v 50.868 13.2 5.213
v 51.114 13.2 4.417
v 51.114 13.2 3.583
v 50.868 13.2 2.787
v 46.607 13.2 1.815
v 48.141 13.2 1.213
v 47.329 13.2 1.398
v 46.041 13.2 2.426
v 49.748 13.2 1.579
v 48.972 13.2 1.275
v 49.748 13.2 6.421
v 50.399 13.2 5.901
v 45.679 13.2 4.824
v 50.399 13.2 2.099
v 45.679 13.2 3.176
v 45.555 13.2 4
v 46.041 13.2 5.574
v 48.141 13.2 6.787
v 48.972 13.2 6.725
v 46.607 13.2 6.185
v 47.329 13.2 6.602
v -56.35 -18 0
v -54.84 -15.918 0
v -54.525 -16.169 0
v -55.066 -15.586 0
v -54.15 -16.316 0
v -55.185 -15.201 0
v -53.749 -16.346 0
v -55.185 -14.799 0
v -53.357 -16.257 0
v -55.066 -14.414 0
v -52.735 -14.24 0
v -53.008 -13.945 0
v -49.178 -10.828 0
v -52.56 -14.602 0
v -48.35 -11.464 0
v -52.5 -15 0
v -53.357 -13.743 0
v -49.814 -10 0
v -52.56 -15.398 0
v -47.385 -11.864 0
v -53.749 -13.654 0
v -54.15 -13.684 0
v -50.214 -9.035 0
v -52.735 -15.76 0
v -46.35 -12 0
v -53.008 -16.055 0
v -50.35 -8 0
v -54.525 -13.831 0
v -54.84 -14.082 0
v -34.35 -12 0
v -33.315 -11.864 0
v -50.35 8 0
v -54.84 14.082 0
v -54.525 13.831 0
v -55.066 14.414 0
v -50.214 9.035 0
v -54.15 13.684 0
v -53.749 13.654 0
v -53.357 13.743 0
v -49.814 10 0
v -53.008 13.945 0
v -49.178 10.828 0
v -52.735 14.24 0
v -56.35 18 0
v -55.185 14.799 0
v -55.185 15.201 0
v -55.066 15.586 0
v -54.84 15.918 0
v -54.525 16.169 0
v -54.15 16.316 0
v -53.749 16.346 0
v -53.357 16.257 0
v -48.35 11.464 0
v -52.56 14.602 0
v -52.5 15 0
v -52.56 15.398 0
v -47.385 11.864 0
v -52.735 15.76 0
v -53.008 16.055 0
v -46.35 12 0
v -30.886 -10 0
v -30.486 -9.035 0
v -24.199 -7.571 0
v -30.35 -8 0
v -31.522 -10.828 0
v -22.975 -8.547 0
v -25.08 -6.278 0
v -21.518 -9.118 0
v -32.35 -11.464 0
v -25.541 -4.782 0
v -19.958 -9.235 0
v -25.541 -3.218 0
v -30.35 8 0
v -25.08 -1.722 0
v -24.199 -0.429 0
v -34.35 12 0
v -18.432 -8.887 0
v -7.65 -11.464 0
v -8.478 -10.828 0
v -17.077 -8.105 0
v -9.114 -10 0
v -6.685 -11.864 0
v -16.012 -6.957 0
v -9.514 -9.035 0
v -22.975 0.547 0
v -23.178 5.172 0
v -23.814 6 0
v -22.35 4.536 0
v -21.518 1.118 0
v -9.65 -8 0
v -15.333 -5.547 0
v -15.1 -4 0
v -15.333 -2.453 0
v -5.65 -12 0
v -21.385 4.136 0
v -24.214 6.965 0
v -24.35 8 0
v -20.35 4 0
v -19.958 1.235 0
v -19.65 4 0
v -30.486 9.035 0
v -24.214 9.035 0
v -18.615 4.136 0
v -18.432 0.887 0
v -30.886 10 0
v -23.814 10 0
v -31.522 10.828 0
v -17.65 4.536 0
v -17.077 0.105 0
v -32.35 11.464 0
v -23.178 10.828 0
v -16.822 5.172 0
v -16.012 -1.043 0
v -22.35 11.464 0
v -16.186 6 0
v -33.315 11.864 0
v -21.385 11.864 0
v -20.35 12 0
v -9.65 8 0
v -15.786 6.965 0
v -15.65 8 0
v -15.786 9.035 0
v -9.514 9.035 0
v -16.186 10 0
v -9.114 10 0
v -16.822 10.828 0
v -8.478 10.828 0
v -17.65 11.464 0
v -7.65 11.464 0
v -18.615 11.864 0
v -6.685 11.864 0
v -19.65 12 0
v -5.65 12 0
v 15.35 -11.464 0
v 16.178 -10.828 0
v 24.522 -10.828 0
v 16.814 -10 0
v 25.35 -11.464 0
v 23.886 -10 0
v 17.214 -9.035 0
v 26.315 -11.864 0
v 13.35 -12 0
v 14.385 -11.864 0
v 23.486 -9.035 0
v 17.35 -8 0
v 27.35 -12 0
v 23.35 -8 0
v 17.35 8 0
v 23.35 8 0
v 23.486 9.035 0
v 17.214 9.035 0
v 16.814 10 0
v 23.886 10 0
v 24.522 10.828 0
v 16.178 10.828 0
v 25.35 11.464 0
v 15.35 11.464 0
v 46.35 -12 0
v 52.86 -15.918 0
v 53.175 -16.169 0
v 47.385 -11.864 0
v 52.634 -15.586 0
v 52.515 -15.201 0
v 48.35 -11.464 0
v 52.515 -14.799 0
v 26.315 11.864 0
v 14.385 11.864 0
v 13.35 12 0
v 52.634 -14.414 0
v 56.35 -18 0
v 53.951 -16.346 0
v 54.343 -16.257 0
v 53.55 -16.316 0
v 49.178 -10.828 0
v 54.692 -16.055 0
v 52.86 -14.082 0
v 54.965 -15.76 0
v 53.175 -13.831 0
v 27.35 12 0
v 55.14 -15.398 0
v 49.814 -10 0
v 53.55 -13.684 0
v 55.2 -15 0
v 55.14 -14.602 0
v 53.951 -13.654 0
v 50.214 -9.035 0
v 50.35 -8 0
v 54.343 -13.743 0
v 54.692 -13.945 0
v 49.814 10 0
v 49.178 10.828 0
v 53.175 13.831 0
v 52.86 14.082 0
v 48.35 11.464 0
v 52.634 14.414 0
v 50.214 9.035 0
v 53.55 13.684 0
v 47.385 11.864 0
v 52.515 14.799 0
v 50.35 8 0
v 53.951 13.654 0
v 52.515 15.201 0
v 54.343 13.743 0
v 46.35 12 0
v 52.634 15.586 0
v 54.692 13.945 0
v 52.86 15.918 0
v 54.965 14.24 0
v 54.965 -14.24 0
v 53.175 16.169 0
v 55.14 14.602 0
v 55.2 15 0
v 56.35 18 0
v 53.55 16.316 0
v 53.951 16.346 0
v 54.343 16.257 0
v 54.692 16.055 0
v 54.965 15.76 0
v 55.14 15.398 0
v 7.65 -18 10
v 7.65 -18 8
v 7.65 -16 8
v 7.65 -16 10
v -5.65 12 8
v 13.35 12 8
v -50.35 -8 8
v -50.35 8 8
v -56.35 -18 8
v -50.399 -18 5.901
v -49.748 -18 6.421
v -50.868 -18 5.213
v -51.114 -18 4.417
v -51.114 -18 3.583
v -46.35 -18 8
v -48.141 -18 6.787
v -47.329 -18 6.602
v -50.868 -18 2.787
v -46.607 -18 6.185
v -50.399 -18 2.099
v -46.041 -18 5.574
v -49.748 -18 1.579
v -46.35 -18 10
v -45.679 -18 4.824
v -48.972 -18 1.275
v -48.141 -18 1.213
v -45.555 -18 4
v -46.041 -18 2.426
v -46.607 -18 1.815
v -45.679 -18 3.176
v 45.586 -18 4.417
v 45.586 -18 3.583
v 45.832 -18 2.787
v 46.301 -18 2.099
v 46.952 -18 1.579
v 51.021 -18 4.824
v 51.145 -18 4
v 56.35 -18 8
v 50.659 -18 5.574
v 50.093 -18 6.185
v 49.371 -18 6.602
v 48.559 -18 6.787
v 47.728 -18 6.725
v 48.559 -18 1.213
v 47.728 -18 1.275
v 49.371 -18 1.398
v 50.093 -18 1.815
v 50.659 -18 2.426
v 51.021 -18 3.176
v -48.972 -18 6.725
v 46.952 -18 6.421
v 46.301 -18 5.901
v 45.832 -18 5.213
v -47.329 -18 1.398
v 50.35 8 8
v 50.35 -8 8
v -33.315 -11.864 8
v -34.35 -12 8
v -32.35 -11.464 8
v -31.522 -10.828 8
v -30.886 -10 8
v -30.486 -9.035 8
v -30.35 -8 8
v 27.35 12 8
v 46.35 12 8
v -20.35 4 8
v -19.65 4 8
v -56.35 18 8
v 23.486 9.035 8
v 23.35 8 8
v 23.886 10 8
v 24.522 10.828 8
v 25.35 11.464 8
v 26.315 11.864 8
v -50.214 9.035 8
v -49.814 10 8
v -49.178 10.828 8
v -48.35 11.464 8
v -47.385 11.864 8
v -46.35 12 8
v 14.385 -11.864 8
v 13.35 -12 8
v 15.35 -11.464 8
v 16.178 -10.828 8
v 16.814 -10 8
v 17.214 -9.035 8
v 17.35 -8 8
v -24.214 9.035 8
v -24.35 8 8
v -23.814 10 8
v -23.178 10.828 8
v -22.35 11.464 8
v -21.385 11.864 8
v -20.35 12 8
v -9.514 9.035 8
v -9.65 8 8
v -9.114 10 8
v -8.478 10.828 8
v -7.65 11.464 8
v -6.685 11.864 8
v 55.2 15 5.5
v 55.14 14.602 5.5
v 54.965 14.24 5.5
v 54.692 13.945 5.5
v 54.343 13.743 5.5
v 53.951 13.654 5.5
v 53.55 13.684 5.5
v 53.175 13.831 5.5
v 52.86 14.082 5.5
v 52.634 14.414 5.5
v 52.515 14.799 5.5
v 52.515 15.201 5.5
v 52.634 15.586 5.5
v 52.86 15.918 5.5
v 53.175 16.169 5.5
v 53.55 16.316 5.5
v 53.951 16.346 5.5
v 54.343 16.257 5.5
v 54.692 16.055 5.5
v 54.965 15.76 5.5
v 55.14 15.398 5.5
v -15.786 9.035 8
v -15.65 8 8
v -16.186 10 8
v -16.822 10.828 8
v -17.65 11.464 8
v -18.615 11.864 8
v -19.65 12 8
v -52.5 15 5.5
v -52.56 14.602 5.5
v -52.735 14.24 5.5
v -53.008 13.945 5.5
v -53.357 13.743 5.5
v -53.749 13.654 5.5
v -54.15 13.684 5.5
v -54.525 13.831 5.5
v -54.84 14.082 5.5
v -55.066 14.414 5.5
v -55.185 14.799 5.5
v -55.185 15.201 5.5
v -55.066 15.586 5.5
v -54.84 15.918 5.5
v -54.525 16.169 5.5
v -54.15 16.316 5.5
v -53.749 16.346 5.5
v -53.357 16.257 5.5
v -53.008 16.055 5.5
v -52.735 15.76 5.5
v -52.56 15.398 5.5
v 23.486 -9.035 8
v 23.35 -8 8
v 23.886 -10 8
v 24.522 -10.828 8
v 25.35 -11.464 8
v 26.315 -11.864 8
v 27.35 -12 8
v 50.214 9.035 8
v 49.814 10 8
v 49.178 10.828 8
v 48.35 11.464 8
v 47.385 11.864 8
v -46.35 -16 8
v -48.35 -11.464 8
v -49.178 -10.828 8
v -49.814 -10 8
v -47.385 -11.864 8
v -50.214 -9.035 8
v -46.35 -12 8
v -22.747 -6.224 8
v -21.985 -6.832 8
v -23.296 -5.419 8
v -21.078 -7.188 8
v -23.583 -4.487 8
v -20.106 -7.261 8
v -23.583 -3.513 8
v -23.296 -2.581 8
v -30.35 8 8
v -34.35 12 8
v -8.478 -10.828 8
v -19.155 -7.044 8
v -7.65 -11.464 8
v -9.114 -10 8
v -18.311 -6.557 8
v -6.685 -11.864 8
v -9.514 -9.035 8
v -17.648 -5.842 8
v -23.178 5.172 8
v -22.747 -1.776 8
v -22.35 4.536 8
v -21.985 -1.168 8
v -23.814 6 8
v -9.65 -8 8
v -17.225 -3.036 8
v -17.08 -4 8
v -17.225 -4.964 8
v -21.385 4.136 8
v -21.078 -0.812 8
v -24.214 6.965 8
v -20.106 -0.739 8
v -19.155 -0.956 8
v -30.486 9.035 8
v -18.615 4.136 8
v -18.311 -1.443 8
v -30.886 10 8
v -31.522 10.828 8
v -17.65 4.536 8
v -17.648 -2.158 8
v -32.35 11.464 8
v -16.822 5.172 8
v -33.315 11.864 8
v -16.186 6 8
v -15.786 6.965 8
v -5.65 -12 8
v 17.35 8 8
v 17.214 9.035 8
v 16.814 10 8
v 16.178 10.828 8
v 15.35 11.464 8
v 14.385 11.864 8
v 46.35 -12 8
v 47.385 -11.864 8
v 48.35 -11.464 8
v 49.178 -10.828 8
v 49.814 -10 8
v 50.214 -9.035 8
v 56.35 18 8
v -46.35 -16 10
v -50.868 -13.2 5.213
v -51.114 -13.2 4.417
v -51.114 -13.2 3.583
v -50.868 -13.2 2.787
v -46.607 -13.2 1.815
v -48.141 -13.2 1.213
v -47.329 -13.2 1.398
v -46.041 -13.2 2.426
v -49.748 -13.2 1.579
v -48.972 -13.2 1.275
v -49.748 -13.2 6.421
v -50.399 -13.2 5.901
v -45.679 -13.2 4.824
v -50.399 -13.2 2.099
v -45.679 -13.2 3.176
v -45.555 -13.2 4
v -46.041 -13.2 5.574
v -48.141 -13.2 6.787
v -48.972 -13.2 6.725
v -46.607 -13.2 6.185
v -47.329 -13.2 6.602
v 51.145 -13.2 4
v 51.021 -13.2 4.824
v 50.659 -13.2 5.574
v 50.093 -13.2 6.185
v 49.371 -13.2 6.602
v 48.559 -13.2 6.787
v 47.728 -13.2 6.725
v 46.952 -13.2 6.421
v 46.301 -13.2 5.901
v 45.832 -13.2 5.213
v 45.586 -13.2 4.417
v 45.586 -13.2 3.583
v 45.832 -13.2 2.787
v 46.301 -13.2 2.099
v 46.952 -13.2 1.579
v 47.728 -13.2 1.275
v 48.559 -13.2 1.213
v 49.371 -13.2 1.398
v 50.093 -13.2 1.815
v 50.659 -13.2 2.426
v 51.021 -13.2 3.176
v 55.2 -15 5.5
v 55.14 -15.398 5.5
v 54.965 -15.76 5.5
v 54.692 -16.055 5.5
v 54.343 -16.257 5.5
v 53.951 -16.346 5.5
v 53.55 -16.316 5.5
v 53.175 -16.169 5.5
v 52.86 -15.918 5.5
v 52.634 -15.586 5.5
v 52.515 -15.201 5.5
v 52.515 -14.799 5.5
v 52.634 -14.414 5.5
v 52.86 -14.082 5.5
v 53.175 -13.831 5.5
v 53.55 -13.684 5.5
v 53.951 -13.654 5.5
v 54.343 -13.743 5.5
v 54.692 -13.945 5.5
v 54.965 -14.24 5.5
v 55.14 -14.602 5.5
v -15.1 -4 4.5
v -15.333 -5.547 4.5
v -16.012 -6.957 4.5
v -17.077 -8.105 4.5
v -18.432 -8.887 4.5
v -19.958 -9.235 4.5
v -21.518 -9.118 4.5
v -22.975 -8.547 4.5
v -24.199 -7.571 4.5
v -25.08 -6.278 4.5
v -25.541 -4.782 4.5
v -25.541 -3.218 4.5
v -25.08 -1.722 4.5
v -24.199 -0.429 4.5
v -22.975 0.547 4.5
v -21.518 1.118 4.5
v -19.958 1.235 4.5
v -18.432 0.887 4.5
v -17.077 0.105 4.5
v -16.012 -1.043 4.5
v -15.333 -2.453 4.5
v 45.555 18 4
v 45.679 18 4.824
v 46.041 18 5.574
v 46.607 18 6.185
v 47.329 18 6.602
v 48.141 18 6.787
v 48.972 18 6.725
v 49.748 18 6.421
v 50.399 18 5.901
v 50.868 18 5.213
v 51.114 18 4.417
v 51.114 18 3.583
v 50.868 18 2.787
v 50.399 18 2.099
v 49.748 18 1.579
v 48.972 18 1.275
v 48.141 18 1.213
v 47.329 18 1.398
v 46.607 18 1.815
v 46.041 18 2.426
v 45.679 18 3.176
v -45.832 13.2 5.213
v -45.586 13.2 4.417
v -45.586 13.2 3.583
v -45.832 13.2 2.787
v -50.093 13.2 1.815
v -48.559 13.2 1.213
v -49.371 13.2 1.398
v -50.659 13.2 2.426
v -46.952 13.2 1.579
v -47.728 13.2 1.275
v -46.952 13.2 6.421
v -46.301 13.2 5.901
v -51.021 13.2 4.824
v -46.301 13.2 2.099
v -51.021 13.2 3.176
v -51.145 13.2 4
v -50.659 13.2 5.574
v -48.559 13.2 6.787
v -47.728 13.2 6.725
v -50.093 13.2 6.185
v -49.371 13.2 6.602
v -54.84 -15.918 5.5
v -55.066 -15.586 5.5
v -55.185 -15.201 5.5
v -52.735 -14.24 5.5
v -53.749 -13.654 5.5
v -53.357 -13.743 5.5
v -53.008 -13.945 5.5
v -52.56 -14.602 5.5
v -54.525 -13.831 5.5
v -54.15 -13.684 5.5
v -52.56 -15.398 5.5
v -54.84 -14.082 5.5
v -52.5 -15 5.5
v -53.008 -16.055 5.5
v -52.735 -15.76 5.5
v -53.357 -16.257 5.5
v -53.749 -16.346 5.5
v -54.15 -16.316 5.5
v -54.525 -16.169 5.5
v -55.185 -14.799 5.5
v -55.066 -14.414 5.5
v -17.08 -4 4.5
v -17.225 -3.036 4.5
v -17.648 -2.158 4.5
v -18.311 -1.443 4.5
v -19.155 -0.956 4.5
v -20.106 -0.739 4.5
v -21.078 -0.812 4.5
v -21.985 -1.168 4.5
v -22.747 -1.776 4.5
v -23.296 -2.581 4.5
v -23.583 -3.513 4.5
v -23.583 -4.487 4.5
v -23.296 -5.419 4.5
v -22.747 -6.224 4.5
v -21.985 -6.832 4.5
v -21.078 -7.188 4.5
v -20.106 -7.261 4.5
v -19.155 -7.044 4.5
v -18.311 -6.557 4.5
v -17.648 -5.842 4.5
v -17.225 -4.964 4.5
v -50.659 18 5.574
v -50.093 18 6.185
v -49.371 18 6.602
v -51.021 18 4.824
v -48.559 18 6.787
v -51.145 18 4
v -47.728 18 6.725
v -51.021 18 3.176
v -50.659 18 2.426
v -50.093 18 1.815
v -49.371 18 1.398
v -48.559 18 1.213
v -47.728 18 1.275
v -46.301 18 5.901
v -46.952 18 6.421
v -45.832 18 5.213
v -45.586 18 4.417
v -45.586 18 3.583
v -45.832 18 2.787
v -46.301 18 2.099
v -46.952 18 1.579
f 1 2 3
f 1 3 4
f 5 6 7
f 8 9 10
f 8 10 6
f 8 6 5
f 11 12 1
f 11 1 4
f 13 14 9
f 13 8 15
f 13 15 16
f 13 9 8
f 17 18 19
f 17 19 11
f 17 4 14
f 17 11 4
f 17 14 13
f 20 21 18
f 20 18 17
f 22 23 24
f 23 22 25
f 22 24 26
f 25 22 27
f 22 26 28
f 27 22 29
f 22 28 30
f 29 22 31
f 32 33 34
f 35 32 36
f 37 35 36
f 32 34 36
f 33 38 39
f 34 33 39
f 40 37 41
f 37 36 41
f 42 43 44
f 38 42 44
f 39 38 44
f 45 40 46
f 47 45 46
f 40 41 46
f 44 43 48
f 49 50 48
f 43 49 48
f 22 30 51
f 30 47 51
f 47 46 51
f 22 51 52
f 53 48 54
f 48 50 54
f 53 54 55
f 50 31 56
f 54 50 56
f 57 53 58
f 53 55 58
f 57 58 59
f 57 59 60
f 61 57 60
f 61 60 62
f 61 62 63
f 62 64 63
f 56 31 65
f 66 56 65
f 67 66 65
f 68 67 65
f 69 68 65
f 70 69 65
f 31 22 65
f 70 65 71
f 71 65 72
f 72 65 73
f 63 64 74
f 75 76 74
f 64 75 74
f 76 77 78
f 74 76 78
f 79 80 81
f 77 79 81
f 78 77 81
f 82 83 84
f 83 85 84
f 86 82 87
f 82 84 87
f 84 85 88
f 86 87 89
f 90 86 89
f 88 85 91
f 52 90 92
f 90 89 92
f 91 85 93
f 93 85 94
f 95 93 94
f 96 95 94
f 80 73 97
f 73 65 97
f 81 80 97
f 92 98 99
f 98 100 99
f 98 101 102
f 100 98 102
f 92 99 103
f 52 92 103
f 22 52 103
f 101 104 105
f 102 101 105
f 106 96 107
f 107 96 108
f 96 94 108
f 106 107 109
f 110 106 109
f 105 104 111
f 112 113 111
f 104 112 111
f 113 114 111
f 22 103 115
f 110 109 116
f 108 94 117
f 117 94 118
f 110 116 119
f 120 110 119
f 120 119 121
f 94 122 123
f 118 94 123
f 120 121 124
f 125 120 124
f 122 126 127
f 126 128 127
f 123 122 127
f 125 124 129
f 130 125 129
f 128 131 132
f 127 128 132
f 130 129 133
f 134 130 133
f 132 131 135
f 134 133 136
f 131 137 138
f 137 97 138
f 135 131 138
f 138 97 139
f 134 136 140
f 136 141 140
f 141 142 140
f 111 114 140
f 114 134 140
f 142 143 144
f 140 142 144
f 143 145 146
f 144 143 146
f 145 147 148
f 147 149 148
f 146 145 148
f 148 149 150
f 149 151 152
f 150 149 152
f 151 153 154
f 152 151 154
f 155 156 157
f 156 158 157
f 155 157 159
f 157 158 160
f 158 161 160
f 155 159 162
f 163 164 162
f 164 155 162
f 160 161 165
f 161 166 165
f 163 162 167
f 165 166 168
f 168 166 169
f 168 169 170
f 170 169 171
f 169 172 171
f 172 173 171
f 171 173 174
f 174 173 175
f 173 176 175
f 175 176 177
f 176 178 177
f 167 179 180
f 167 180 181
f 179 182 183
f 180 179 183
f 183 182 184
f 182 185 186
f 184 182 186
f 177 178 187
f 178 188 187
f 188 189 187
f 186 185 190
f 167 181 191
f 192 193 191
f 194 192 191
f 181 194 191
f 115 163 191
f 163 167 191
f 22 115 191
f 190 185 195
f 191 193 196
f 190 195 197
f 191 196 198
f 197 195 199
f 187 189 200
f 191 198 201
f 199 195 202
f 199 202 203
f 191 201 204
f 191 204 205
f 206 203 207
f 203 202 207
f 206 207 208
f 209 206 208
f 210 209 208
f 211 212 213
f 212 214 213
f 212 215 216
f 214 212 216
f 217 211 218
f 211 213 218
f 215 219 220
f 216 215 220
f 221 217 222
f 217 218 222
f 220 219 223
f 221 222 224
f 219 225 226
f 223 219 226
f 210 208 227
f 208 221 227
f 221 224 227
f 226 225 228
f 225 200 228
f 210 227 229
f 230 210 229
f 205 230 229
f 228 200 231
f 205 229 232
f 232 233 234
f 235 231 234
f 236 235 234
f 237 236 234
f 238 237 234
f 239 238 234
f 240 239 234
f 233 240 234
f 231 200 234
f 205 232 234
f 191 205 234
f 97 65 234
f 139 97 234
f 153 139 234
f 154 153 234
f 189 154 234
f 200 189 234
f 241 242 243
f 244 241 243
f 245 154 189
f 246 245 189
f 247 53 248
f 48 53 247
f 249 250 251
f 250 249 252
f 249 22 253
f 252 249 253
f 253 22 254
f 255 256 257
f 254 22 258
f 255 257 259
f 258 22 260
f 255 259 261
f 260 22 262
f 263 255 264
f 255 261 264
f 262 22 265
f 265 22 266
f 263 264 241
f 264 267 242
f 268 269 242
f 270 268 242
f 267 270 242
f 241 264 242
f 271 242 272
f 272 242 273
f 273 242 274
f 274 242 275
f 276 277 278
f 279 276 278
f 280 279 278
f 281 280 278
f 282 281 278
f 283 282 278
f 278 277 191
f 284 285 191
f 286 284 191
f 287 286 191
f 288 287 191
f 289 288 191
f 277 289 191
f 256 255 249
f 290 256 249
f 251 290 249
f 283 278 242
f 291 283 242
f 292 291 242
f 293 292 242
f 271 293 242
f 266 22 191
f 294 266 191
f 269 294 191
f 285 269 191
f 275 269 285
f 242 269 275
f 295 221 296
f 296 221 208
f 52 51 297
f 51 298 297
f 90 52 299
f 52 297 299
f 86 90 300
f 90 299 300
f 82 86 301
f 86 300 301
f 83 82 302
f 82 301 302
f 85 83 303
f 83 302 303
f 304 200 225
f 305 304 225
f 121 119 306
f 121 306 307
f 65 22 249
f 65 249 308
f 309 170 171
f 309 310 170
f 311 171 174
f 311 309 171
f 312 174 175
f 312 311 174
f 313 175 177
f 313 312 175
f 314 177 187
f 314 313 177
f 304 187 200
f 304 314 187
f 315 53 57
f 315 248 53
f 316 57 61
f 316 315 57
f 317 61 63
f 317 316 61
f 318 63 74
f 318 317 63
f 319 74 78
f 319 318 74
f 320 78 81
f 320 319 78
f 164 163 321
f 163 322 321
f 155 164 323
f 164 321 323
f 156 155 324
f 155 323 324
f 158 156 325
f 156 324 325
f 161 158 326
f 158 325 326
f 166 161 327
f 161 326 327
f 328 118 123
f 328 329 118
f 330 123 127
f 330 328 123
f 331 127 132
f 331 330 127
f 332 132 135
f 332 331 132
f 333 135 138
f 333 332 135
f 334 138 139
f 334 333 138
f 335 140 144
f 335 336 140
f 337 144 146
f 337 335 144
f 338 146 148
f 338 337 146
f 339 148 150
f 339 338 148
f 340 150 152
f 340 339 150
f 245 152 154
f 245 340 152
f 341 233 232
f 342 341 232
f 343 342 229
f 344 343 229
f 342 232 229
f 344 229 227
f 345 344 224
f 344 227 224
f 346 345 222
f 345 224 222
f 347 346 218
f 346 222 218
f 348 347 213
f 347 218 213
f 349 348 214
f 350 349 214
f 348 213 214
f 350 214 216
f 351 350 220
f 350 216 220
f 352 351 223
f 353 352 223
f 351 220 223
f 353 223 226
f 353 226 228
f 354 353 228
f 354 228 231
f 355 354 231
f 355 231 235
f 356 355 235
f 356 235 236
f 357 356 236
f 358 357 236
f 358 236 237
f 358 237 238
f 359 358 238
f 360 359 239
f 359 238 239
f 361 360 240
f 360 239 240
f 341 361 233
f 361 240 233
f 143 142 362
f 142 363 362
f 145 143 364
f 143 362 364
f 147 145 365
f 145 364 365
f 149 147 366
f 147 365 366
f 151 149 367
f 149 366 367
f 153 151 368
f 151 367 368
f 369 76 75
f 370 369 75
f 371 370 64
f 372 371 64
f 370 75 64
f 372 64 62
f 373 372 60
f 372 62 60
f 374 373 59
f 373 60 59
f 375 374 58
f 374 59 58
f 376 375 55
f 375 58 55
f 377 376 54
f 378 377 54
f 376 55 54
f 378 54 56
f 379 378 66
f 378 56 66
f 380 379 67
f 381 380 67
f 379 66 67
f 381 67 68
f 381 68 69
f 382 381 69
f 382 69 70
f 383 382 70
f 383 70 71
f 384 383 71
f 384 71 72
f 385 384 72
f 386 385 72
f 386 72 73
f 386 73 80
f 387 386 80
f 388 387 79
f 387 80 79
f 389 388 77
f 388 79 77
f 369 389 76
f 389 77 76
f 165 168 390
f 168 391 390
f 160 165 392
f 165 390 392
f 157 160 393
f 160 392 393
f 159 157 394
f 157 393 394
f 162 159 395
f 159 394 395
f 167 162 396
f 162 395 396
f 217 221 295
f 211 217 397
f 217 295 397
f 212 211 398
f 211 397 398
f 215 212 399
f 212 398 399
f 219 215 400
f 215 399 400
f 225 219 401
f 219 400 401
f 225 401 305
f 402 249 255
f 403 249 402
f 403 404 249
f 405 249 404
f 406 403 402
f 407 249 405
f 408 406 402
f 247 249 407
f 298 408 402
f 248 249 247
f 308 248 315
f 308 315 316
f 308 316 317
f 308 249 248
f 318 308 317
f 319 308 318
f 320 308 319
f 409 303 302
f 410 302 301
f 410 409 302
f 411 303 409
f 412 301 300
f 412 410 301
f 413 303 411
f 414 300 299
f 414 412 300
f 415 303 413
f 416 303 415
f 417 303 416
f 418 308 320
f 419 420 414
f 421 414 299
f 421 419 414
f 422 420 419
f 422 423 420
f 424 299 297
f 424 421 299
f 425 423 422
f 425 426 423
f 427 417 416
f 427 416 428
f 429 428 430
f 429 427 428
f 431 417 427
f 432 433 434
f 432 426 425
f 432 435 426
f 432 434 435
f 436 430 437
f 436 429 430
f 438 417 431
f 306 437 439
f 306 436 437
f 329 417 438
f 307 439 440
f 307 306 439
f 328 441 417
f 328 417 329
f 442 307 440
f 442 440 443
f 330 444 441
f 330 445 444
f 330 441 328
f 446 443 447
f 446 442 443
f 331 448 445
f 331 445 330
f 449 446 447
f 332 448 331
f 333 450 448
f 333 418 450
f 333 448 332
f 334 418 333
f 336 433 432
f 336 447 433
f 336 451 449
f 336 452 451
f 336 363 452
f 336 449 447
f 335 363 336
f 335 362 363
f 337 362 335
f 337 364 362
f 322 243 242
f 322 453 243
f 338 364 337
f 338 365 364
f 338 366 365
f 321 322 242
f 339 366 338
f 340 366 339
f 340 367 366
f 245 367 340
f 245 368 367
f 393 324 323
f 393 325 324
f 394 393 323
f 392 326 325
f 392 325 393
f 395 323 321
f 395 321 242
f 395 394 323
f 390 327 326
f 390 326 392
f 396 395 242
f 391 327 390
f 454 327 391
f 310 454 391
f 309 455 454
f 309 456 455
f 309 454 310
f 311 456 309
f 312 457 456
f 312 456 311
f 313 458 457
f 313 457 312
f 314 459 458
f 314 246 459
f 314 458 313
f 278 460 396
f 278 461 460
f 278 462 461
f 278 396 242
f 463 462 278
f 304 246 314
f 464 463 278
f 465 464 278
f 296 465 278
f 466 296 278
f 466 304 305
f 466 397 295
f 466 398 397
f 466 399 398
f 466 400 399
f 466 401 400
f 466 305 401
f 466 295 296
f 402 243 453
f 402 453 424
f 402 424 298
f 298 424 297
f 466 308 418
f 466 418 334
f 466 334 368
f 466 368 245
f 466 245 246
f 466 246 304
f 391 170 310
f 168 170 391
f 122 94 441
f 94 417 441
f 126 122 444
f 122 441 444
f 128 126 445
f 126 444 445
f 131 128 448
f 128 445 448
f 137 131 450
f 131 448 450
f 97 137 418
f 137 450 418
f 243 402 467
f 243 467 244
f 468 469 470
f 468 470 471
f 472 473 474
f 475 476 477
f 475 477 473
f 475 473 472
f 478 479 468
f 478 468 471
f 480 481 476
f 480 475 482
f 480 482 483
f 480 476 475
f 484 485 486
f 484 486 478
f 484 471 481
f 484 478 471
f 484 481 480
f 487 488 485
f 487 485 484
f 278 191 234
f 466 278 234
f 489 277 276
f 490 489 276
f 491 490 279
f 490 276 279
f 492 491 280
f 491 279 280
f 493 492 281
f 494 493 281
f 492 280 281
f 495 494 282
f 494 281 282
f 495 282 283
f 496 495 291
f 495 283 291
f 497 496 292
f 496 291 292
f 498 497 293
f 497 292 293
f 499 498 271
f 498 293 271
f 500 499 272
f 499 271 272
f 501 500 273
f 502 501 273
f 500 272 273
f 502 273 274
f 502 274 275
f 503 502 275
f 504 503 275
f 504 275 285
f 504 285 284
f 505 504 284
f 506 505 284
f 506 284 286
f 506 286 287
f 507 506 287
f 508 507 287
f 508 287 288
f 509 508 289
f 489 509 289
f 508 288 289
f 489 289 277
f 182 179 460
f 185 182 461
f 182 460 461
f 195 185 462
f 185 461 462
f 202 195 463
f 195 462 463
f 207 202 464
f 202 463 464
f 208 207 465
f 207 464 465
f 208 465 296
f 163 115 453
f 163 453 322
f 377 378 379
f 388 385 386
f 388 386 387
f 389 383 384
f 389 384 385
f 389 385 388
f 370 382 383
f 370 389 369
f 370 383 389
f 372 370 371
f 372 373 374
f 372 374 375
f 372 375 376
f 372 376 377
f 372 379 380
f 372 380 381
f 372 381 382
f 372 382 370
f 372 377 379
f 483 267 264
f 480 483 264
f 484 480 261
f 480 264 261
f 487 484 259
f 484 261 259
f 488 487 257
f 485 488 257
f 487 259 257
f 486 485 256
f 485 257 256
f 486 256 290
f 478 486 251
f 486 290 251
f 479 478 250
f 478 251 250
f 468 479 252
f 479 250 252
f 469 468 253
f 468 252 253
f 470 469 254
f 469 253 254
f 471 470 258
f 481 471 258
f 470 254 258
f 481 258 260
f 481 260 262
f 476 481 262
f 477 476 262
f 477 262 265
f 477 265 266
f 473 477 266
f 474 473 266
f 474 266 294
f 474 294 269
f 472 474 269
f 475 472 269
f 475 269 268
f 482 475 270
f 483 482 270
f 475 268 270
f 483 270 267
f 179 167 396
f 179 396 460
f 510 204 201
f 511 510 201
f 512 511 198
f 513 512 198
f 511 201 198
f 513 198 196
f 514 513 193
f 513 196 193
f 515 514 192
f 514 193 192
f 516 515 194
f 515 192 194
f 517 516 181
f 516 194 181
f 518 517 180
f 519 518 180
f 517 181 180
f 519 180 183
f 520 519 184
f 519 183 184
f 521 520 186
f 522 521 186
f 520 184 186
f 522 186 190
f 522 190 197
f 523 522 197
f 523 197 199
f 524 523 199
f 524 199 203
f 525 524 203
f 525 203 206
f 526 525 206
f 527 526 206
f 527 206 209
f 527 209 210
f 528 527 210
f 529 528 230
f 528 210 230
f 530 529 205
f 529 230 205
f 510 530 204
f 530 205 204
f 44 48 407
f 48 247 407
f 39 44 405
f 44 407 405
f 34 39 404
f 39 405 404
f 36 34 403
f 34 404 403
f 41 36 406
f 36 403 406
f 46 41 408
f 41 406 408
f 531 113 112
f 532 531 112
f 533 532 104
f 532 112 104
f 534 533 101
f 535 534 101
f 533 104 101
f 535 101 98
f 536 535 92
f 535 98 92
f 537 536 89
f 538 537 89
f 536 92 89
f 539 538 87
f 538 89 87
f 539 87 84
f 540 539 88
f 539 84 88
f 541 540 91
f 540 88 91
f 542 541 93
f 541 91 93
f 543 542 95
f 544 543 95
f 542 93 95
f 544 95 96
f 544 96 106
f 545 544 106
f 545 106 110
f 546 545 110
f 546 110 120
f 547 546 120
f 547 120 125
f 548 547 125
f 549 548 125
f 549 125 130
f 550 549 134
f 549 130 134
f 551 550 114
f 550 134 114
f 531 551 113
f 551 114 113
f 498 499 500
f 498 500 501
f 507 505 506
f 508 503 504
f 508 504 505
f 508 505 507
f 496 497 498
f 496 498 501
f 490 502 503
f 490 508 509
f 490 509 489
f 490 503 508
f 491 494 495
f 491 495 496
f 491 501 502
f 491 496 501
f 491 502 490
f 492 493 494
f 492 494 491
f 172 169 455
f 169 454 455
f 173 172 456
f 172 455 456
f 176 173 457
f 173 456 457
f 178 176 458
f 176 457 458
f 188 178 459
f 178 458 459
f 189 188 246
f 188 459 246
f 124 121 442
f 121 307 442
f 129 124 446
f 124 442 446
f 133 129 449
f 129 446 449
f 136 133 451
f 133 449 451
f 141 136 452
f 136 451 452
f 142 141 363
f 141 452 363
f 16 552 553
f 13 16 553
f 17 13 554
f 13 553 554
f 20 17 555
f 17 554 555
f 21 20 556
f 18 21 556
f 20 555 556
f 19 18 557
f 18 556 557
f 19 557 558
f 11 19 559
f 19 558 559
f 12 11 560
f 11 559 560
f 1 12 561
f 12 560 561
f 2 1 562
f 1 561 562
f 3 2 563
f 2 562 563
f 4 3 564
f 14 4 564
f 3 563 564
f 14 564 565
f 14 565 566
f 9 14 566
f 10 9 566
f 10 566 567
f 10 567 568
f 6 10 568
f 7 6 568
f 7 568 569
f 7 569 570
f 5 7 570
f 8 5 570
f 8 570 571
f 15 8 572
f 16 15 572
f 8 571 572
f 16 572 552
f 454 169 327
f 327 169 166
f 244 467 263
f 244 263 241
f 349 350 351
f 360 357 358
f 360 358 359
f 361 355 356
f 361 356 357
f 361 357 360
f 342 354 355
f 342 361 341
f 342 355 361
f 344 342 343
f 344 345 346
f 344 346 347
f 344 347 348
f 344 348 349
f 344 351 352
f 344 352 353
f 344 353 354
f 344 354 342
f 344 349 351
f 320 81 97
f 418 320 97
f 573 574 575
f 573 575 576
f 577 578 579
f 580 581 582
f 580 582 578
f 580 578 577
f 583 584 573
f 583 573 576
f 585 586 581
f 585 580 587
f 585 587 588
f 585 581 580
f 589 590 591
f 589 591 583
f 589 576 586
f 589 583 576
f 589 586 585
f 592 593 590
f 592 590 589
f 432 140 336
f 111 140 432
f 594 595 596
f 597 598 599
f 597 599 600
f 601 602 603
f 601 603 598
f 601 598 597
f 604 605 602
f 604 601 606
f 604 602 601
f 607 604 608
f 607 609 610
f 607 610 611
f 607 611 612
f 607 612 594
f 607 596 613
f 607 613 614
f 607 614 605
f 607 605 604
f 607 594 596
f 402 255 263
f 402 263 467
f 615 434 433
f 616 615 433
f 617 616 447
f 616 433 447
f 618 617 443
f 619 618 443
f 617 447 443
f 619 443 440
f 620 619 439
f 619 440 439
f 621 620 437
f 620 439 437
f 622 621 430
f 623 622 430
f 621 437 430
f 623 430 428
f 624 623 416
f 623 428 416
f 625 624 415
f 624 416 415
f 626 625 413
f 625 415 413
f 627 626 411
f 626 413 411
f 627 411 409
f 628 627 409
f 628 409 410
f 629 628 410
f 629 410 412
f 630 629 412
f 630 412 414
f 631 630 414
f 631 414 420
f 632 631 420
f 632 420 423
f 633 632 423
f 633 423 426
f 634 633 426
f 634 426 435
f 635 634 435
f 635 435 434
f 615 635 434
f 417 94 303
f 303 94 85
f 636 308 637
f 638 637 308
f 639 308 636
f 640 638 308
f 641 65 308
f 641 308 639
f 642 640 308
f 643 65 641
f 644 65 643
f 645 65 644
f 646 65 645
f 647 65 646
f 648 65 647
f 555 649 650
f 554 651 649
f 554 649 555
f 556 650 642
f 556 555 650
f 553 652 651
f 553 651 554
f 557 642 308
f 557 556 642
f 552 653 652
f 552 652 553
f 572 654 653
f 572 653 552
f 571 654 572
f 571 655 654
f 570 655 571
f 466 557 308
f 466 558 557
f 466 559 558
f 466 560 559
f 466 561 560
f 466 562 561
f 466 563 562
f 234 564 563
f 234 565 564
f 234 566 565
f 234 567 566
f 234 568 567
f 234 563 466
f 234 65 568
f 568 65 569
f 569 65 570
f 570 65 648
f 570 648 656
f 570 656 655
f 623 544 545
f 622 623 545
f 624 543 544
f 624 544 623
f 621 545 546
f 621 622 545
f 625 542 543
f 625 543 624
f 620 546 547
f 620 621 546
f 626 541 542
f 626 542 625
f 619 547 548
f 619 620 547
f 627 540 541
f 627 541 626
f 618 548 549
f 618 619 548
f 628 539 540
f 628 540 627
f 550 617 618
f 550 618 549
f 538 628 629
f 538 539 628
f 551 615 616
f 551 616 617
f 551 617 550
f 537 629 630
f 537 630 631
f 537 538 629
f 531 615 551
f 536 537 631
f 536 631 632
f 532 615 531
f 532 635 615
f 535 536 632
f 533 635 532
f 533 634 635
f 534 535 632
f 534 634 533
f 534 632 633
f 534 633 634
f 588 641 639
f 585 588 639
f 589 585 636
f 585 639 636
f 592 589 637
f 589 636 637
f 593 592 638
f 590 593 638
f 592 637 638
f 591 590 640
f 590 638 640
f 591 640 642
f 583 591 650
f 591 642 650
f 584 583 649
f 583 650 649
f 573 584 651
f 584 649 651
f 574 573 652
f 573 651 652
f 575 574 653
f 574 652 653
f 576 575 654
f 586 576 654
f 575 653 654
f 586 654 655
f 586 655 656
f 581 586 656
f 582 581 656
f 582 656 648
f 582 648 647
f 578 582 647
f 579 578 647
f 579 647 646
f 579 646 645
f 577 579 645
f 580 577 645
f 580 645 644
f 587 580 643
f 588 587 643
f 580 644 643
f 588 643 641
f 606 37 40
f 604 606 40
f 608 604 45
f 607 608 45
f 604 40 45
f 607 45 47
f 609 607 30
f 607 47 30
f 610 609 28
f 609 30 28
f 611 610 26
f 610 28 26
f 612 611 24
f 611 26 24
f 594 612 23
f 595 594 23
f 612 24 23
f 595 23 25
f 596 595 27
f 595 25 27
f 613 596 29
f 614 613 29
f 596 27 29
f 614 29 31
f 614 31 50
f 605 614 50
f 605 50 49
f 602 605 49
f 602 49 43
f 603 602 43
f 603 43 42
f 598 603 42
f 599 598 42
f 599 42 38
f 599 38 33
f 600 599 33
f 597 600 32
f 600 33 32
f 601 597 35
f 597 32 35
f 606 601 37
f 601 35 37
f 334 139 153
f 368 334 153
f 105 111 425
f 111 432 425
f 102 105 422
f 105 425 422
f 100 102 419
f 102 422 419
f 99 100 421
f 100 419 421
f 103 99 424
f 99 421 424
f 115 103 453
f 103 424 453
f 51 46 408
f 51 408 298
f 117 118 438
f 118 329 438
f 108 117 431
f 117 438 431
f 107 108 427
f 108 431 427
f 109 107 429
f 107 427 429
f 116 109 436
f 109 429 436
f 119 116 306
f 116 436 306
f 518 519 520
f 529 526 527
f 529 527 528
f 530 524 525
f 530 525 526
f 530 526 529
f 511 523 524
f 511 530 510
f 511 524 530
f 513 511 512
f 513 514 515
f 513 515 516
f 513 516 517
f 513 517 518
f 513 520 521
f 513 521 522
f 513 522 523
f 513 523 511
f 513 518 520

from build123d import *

# Parameters (mm, degrees)
F0_W      = 112.7
F0_H      = 36
F1_DEPTH  = 8
F3_W      = 54
F3_H      = 2
F4_DEPTH  = 2
F5_R      = 3.27
F6_DEPTH  = 8.001
F7_R      = 1.35
F8_DEPTH  = 5.5
F10_R     = 5.25
F11_DEPTH = 4.5
F9_W      = 20
F9_H      = 24
F9_W_2    = 27
F9_W_3    = 8.7
F9_H_2    = 8
F12_DEPTH = 10.001
F13_R     = 3.99999
F14_R     = 2.795
F15_DEPTH = 4.8
F16_R     = 2.795
F17_DEPTH = 4.8


# Not quite as in the source:
# - a fillet or chamfer is up to 0.001 mm smaller than in the source, because OpenCascade refuses the exact size


with BuildPart() as f1:
    # F0 (on Top) → F1 (new body)
    with BuildSketch(Plane.XY):
        Rectangle(F0_W, F0_H)
    extrude(amount=F1_DEPTH)

    # F3 (on face) → F4 (join)
    with BuildSketch(Plane.XY.offset(8)):
        with Locations((-19.35, -17)):
            Rectangle(F3_W, F3_H)
    extrude(amount=F4_DEPTH)

    # F5 (on face) → F6 (cut, through all)
    with BuildSketch(Plane.XY.offset(8)):
        with Locations((-20.35, -4)):
            Circle(F5_R)
    extrude(amount=-F6_DEPTH, mode=Mode.SUBTRACT)

    # F7 (on face) → F8 (cut)
    with BuildSketch(Plane(origin=(0, 0, 0), x_dir=(1, 0, 0), z_dir=(0, 0, -1))):
        with Locations((-53.85, 15)):
            Circle(F7_R)
        with Locations((-53.85, -15)):
            Circle(F7_R)
        with Locations((53.85, 15)):
            Circle(F7_R)
        with Locations((53.85, -15)):
            Circle(F7_R)
    extrude(amount=-F8_DEPTH, mode=Mode.SUBTRACT)

    # F10 (on face) → F11 (cut)
    with BuildSketch(Plane(origin=(0, 0, 0), x_dir=(1, 0, 0), z_dir=(0, 0, -1))):
        with Locations((-20.35, 4)):
            Circle(F10_R)
    extrude(amount=-F11_DEPTH, mode=Mode.SUBTRACT)

    # F9 (on face) → F12 (cut, through all)
    with BuildSketch(Plane(origin=(0, 0, 0), x_dir=(1, 0, 0), z_dir=(0, 0, -1))):
        with Locations((-40.35, 0)):
            Rectangle(F9_W, F9_H)
        with Locations((3.85, 0)):
            Rectangle(F9_W_2, F9_H)
        with Locations((36.85, 0)):
            Rectangle(F9_W_2, F9_H)
        with Locations((-20, -8)):
            Rectangle(F9_W_3, F9_H_2)
    extrude(amount=-F12_DEPTH, mode=Mode.SUBTRACT)

    # F13 (radius 4 in the source; OpenCascade refuses exactly that, so slightly less here)
    f13_edges = [f1.edges().sort_by_distance(p)[0] for p in [
        (-30.35, -12, 4),
        (-50.35, -12, 4),
        (-50.35, 12, 4),
        (-30.35, 12, 4),
        (-24.35, 4, 4),
        (-9.65, -12, 4),
        (23.35, -12, 4),
        (-9.65, 12, 4),
        (-24.35, 12, 4),
        (17.35, -12, 4),
        (50.35, -12, 4),
        (50.35, 12, 4),
        (23.35, 12, 4),
        (-15.65, 4, 4),
        (-15.65, 12, 4),
        (17.35, 12, 4),
    ]]
    fillet(f13_edges, radius=F13_R)

    # F14 (on face) → F15 (cut)
    with BuildSketch(Plane.XZ.offset(18)):
        with Locations((48.35, 4)):
            Circle(F14_R)
        with Locations((-48.35, 4)):
            Circle(F14_R)
    extrude(amount=-F15_DEPTH, mode=Mode.SUBTRACT)

    # F16 (on face) → F17 (cut)
    with BuildSketch(Plane(origin=(0, 18, 0), x_dir=(-1, 0, 0), z_dir=(0, 1, 0))):
        with Locations((48.35, 4)):
            Circle(F16_R)
        with Locations((-48.35, 4)):
            Circle(F16_R)
    extrude(amount=-F17_DEPTH, mode=Mode.SUBTRACT)


solid = f1.part
